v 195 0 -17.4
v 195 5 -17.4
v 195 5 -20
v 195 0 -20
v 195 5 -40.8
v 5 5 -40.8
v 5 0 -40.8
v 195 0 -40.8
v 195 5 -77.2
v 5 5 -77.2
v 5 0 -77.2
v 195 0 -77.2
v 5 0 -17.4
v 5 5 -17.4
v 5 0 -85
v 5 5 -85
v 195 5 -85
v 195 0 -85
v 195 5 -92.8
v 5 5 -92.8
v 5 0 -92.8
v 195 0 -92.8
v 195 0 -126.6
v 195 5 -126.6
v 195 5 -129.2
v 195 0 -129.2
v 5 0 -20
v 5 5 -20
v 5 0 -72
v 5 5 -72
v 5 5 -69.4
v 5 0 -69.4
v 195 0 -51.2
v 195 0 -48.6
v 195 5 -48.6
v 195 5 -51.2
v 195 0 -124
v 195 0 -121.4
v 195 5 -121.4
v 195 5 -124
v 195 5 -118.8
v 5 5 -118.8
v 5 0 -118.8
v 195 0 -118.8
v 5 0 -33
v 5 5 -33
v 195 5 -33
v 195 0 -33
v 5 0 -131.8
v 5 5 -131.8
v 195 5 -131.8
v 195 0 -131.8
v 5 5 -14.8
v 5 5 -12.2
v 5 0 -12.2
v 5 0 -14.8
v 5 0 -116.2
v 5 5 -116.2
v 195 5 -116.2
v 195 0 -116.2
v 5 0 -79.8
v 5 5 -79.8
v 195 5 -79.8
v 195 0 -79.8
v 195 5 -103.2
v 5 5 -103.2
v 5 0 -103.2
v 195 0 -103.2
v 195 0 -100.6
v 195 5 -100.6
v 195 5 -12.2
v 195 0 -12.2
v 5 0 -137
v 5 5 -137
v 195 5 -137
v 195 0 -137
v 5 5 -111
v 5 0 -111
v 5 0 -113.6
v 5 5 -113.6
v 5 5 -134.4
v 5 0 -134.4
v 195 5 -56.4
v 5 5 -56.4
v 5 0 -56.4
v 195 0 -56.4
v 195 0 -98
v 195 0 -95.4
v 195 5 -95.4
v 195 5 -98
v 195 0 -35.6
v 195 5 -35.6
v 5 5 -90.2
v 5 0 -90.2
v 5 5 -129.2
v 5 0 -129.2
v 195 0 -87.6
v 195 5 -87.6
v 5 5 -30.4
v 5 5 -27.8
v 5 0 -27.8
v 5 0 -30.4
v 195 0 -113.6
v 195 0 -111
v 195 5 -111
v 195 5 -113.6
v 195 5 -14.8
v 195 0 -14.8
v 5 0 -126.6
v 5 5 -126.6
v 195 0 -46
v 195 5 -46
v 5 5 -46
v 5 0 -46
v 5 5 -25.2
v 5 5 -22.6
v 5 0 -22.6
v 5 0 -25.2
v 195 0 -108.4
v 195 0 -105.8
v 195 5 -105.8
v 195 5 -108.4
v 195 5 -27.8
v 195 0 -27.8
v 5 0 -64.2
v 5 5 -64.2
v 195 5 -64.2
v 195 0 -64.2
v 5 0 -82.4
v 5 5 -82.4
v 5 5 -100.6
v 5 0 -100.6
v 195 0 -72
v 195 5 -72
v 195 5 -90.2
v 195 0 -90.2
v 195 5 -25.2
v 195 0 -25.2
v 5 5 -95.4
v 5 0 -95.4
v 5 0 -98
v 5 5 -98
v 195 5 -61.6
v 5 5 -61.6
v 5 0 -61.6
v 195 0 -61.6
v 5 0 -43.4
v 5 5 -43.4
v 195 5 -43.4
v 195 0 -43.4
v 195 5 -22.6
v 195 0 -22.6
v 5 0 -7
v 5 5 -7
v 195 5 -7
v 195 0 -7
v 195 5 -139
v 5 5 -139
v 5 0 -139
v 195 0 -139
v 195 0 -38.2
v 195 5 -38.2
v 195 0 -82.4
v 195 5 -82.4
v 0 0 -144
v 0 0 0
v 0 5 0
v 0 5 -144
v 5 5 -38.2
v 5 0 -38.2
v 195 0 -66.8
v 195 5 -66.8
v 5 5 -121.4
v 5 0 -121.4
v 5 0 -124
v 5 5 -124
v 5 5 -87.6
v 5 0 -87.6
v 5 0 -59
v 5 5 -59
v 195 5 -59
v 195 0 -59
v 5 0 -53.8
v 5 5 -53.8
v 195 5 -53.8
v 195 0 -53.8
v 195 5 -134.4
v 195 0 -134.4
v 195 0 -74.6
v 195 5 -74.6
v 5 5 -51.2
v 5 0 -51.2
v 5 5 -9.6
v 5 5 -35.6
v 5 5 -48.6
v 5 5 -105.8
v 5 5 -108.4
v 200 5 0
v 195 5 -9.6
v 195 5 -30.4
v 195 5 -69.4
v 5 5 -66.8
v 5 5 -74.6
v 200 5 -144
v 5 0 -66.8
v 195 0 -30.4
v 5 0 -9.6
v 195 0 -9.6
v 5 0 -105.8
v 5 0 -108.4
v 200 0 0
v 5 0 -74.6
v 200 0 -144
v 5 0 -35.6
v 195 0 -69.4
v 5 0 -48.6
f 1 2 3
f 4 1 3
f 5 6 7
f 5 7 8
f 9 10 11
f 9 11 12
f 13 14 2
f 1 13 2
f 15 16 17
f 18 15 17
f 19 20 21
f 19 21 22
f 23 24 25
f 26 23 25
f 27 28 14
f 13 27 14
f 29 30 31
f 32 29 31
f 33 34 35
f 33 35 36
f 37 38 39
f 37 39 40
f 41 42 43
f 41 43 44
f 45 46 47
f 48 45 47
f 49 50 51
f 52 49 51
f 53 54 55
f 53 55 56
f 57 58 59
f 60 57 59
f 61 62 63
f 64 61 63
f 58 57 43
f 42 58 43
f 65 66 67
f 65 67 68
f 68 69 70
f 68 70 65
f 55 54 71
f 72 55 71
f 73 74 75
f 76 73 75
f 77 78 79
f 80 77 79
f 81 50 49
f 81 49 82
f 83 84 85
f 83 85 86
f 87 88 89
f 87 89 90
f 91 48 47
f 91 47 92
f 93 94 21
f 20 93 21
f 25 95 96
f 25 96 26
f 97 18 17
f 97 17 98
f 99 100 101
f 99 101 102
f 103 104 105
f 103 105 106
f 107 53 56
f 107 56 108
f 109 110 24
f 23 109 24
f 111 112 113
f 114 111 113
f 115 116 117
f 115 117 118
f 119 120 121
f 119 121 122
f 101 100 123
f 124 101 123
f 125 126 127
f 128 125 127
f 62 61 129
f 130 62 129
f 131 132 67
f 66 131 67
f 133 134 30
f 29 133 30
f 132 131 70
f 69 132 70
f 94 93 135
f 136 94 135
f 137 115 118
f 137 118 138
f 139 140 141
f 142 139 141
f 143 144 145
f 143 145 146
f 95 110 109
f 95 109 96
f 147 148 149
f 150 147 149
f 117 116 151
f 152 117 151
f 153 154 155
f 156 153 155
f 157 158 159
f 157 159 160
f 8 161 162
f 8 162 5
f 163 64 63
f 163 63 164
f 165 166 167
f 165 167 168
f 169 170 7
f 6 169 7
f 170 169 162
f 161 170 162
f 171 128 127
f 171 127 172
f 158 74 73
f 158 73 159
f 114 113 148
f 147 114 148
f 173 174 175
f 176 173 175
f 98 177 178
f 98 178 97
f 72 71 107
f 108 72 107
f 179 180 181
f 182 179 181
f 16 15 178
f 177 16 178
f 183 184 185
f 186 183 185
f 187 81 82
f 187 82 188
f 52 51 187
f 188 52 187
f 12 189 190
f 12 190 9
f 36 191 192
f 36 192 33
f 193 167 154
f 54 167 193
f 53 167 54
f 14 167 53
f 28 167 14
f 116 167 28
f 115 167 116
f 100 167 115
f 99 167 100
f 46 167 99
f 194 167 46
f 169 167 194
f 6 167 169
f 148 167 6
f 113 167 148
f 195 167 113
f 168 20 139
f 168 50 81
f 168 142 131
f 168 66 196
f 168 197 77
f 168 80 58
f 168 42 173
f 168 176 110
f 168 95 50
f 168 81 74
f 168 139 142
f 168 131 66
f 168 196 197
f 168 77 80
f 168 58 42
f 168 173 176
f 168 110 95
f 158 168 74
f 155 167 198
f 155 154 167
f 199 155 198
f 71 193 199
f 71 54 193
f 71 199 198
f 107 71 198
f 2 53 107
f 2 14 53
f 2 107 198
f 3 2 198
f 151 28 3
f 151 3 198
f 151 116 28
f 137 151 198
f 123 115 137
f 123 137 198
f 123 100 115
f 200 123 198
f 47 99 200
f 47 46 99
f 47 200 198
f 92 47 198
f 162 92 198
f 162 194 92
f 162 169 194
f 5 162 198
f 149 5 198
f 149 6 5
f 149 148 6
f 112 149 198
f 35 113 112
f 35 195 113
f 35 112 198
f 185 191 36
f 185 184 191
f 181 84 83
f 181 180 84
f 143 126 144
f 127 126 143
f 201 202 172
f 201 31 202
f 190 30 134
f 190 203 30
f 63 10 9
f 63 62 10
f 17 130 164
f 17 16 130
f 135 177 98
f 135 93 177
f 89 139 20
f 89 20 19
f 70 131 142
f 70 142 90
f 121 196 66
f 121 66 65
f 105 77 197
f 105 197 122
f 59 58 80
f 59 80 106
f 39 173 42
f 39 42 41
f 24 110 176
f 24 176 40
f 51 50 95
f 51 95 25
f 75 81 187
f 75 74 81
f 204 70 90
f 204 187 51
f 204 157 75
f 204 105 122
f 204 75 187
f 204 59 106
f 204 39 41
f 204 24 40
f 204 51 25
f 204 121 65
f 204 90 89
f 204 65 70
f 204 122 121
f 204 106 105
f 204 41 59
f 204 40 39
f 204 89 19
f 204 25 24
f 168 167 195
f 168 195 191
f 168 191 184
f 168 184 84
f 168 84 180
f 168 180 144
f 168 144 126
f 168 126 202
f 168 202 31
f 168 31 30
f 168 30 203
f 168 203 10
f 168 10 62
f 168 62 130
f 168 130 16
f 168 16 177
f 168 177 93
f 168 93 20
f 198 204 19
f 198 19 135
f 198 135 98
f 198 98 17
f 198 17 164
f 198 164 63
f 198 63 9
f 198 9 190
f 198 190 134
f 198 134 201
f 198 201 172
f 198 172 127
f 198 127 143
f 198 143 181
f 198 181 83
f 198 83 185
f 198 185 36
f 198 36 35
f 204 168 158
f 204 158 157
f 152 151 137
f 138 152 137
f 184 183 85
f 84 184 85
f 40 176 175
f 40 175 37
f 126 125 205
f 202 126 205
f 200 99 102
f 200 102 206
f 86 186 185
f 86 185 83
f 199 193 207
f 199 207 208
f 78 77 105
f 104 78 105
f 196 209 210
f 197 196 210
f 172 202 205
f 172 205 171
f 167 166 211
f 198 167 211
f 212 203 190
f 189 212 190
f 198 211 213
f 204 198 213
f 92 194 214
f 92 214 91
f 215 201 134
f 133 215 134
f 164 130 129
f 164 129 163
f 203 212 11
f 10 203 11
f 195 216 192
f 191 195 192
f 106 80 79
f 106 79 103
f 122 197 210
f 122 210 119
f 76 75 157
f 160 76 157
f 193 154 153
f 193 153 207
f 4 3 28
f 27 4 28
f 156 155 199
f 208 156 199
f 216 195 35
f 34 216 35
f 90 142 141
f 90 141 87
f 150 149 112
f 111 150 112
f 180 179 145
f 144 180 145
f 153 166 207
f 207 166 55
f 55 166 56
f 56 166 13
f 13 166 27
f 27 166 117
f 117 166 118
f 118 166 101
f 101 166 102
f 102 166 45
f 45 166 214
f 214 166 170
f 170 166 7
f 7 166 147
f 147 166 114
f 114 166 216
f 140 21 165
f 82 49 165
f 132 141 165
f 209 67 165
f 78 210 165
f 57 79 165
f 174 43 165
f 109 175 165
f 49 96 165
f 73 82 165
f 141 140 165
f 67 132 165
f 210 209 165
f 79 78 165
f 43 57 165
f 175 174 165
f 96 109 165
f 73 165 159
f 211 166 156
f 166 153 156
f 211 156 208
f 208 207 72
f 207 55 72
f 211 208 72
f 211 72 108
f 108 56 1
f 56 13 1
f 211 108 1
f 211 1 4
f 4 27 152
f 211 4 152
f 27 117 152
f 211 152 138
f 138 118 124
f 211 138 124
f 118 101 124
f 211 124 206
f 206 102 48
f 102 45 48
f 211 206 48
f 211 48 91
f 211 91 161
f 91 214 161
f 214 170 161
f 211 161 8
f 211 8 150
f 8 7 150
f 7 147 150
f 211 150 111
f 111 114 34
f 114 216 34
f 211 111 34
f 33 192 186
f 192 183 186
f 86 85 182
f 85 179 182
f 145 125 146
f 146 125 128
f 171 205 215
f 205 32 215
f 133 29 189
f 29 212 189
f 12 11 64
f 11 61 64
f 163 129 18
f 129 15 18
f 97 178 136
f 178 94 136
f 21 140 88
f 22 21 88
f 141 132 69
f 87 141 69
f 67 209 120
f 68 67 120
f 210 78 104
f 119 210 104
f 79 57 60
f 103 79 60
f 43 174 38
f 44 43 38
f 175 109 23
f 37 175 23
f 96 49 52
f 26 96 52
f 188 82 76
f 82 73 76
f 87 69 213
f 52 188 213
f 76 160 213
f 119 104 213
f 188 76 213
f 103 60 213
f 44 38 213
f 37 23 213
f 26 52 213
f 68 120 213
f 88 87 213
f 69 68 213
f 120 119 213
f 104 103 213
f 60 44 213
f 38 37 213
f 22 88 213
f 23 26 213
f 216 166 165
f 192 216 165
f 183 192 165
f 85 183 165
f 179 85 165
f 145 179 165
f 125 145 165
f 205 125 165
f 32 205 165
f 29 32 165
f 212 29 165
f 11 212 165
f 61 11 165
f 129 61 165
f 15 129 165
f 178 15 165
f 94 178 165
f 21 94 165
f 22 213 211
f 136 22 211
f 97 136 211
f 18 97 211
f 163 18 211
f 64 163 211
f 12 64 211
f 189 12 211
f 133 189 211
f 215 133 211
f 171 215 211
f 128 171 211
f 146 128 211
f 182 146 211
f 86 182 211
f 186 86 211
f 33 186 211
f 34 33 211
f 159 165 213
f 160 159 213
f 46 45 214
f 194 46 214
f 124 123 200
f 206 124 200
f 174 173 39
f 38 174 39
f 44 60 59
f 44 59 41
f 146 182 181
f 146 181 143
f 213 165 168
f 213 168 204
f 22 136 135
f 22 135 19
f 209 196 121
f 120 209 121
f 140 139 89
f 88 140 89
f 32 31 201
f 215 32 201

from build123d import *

# Parameters (mm, degrees)
SKETCH1_W           = 200
SKETCH1_H           = 144
BOSS_EXTRUDE1_DEPTH = 5
SKETCH2_W           = 190
SKETCH2_H           = 2
SKETCH2_H_2         = 2.6
CUT_EXTRUDE1_DEPTH  = 5


with BuildPart() as part:
    # Sketch1 → Boss-Extrude1 (new body)
    with BuildSketch(Plane(origin=(0, 0, 0), x_dir=(1, 0, 0), z_dir=(0, 1, 0))):
        with Locations((100, 72)):
            Rectangle(SKETCH1_W, SKETCH1_H)
    extrude(amount=BOSS_EXTRUDE1_DEPTH)

    # Sketch2 → Cut-Extrude1 (cut)
    with BuildSketch(Plane(origin=(0, 5, 0), x_dir=(1, 0, 0), z_dir=(0, 1, 0))):
        with Locations((100, 138)):
            Rectangle(SKETCH2_W, SKETCH2_H)
        with Locations((100, 133.1)):
            Rectangle(SKETCH2_W, SKETCH2_H_2)
        with Locations((100, 127.9)):
            Rectangle(SKETCH2_W, SKETCH2_H_2)
        with Locations((100, 122.7)):
            Rectangle(SKETCH2_W, SKETCH2_H_2)
        with Locations((100, 117.5)):
            Rectangle(SKETCH2_W, SKETCH2_H_2)
        with Locations((100, 112.3)):
            Rectangle(SKETCH2_W, SKETCH2_H_2)
        with Locations((100, 107.1)):
            Rectangle(SKETCH2_W, SKETCH2_H_2)
        with Locations((100, 101.9)):
            Rectangle(SKETCH2_W, SKETCH2_H_2)
        with Locations((100, 96.7)):
            Rectangle(SKETCH2_W, SKETCH2_H_2)
        with Locations((100, 91.5)):
            Rectangle(SKETCH2_W, SKETCH2_H_2)
        with Locations((100, 86.3)):
            Rectangle(SKETCH2_W, SKETCH2_H_2)
        with Locations((100, 81.1)):
            Rectangle(SKETCH2_W, SKETCH2_H_2)
        with Locations((100, 75.9)):
            Rectangle(SKETCH2_W, SKETCH2_H_2)
        Polygon((195, 72), (5, 72), (5, 70.934071529), (5, 69.4), (195, 69.4), align=None)
        with Locations((100, 65.5)):
            Rectangle(SKETCH2_W, SKETCH2_H_2)
        with Locations((100, 60.3)):
            Rectangle(SKETCH2_W, SKETCH2_H_2)
        with Locations((100, 55.1)):
            Rectangle(SKETCH2_W, SKETCH2_H_2)
        with Locations((100, 49.9)):
            Rectangle(SKETCH2_W, SKETCH2_H_2)
        Polygon((195, 45.599396022), (195, 46), (5, 46), (5, 45.599396022), (5, 43.4), (195, 43.4), align=None)
        with Locations((100, 39.5)):
            Rectangle(SKETCH2_W, SKETCH2_H_2)
        with Locations((100, 34.3)):
            Rectangle(SKETCH2_W, SKETCH2_H_2)
        with Locations((100, 29.1)):
            Rectangle(SKETCH2_W, SKETCH2_H_2)
        with Locations((100, 23.9)):
            Rectangle(SKETCH2_W, SKETCH2_H_2)
        Polygon((195, 18.455100837), (195, 20), (5, 20), (5, 17.4), (195, 17.4), align=None)
        with Locations((100, 13.5)):
            Rectangle(SKETCH2_W, SKETCH2_H_2)
        with Locations((100, 8.3)):
            Rectangle(SKETCH2_W, SKETCH2_H_2)
    extrude(amount=-CUT_EXTRUDE1_DEPTH, mode=Mode.SUBTRACT)


solid = part.part
